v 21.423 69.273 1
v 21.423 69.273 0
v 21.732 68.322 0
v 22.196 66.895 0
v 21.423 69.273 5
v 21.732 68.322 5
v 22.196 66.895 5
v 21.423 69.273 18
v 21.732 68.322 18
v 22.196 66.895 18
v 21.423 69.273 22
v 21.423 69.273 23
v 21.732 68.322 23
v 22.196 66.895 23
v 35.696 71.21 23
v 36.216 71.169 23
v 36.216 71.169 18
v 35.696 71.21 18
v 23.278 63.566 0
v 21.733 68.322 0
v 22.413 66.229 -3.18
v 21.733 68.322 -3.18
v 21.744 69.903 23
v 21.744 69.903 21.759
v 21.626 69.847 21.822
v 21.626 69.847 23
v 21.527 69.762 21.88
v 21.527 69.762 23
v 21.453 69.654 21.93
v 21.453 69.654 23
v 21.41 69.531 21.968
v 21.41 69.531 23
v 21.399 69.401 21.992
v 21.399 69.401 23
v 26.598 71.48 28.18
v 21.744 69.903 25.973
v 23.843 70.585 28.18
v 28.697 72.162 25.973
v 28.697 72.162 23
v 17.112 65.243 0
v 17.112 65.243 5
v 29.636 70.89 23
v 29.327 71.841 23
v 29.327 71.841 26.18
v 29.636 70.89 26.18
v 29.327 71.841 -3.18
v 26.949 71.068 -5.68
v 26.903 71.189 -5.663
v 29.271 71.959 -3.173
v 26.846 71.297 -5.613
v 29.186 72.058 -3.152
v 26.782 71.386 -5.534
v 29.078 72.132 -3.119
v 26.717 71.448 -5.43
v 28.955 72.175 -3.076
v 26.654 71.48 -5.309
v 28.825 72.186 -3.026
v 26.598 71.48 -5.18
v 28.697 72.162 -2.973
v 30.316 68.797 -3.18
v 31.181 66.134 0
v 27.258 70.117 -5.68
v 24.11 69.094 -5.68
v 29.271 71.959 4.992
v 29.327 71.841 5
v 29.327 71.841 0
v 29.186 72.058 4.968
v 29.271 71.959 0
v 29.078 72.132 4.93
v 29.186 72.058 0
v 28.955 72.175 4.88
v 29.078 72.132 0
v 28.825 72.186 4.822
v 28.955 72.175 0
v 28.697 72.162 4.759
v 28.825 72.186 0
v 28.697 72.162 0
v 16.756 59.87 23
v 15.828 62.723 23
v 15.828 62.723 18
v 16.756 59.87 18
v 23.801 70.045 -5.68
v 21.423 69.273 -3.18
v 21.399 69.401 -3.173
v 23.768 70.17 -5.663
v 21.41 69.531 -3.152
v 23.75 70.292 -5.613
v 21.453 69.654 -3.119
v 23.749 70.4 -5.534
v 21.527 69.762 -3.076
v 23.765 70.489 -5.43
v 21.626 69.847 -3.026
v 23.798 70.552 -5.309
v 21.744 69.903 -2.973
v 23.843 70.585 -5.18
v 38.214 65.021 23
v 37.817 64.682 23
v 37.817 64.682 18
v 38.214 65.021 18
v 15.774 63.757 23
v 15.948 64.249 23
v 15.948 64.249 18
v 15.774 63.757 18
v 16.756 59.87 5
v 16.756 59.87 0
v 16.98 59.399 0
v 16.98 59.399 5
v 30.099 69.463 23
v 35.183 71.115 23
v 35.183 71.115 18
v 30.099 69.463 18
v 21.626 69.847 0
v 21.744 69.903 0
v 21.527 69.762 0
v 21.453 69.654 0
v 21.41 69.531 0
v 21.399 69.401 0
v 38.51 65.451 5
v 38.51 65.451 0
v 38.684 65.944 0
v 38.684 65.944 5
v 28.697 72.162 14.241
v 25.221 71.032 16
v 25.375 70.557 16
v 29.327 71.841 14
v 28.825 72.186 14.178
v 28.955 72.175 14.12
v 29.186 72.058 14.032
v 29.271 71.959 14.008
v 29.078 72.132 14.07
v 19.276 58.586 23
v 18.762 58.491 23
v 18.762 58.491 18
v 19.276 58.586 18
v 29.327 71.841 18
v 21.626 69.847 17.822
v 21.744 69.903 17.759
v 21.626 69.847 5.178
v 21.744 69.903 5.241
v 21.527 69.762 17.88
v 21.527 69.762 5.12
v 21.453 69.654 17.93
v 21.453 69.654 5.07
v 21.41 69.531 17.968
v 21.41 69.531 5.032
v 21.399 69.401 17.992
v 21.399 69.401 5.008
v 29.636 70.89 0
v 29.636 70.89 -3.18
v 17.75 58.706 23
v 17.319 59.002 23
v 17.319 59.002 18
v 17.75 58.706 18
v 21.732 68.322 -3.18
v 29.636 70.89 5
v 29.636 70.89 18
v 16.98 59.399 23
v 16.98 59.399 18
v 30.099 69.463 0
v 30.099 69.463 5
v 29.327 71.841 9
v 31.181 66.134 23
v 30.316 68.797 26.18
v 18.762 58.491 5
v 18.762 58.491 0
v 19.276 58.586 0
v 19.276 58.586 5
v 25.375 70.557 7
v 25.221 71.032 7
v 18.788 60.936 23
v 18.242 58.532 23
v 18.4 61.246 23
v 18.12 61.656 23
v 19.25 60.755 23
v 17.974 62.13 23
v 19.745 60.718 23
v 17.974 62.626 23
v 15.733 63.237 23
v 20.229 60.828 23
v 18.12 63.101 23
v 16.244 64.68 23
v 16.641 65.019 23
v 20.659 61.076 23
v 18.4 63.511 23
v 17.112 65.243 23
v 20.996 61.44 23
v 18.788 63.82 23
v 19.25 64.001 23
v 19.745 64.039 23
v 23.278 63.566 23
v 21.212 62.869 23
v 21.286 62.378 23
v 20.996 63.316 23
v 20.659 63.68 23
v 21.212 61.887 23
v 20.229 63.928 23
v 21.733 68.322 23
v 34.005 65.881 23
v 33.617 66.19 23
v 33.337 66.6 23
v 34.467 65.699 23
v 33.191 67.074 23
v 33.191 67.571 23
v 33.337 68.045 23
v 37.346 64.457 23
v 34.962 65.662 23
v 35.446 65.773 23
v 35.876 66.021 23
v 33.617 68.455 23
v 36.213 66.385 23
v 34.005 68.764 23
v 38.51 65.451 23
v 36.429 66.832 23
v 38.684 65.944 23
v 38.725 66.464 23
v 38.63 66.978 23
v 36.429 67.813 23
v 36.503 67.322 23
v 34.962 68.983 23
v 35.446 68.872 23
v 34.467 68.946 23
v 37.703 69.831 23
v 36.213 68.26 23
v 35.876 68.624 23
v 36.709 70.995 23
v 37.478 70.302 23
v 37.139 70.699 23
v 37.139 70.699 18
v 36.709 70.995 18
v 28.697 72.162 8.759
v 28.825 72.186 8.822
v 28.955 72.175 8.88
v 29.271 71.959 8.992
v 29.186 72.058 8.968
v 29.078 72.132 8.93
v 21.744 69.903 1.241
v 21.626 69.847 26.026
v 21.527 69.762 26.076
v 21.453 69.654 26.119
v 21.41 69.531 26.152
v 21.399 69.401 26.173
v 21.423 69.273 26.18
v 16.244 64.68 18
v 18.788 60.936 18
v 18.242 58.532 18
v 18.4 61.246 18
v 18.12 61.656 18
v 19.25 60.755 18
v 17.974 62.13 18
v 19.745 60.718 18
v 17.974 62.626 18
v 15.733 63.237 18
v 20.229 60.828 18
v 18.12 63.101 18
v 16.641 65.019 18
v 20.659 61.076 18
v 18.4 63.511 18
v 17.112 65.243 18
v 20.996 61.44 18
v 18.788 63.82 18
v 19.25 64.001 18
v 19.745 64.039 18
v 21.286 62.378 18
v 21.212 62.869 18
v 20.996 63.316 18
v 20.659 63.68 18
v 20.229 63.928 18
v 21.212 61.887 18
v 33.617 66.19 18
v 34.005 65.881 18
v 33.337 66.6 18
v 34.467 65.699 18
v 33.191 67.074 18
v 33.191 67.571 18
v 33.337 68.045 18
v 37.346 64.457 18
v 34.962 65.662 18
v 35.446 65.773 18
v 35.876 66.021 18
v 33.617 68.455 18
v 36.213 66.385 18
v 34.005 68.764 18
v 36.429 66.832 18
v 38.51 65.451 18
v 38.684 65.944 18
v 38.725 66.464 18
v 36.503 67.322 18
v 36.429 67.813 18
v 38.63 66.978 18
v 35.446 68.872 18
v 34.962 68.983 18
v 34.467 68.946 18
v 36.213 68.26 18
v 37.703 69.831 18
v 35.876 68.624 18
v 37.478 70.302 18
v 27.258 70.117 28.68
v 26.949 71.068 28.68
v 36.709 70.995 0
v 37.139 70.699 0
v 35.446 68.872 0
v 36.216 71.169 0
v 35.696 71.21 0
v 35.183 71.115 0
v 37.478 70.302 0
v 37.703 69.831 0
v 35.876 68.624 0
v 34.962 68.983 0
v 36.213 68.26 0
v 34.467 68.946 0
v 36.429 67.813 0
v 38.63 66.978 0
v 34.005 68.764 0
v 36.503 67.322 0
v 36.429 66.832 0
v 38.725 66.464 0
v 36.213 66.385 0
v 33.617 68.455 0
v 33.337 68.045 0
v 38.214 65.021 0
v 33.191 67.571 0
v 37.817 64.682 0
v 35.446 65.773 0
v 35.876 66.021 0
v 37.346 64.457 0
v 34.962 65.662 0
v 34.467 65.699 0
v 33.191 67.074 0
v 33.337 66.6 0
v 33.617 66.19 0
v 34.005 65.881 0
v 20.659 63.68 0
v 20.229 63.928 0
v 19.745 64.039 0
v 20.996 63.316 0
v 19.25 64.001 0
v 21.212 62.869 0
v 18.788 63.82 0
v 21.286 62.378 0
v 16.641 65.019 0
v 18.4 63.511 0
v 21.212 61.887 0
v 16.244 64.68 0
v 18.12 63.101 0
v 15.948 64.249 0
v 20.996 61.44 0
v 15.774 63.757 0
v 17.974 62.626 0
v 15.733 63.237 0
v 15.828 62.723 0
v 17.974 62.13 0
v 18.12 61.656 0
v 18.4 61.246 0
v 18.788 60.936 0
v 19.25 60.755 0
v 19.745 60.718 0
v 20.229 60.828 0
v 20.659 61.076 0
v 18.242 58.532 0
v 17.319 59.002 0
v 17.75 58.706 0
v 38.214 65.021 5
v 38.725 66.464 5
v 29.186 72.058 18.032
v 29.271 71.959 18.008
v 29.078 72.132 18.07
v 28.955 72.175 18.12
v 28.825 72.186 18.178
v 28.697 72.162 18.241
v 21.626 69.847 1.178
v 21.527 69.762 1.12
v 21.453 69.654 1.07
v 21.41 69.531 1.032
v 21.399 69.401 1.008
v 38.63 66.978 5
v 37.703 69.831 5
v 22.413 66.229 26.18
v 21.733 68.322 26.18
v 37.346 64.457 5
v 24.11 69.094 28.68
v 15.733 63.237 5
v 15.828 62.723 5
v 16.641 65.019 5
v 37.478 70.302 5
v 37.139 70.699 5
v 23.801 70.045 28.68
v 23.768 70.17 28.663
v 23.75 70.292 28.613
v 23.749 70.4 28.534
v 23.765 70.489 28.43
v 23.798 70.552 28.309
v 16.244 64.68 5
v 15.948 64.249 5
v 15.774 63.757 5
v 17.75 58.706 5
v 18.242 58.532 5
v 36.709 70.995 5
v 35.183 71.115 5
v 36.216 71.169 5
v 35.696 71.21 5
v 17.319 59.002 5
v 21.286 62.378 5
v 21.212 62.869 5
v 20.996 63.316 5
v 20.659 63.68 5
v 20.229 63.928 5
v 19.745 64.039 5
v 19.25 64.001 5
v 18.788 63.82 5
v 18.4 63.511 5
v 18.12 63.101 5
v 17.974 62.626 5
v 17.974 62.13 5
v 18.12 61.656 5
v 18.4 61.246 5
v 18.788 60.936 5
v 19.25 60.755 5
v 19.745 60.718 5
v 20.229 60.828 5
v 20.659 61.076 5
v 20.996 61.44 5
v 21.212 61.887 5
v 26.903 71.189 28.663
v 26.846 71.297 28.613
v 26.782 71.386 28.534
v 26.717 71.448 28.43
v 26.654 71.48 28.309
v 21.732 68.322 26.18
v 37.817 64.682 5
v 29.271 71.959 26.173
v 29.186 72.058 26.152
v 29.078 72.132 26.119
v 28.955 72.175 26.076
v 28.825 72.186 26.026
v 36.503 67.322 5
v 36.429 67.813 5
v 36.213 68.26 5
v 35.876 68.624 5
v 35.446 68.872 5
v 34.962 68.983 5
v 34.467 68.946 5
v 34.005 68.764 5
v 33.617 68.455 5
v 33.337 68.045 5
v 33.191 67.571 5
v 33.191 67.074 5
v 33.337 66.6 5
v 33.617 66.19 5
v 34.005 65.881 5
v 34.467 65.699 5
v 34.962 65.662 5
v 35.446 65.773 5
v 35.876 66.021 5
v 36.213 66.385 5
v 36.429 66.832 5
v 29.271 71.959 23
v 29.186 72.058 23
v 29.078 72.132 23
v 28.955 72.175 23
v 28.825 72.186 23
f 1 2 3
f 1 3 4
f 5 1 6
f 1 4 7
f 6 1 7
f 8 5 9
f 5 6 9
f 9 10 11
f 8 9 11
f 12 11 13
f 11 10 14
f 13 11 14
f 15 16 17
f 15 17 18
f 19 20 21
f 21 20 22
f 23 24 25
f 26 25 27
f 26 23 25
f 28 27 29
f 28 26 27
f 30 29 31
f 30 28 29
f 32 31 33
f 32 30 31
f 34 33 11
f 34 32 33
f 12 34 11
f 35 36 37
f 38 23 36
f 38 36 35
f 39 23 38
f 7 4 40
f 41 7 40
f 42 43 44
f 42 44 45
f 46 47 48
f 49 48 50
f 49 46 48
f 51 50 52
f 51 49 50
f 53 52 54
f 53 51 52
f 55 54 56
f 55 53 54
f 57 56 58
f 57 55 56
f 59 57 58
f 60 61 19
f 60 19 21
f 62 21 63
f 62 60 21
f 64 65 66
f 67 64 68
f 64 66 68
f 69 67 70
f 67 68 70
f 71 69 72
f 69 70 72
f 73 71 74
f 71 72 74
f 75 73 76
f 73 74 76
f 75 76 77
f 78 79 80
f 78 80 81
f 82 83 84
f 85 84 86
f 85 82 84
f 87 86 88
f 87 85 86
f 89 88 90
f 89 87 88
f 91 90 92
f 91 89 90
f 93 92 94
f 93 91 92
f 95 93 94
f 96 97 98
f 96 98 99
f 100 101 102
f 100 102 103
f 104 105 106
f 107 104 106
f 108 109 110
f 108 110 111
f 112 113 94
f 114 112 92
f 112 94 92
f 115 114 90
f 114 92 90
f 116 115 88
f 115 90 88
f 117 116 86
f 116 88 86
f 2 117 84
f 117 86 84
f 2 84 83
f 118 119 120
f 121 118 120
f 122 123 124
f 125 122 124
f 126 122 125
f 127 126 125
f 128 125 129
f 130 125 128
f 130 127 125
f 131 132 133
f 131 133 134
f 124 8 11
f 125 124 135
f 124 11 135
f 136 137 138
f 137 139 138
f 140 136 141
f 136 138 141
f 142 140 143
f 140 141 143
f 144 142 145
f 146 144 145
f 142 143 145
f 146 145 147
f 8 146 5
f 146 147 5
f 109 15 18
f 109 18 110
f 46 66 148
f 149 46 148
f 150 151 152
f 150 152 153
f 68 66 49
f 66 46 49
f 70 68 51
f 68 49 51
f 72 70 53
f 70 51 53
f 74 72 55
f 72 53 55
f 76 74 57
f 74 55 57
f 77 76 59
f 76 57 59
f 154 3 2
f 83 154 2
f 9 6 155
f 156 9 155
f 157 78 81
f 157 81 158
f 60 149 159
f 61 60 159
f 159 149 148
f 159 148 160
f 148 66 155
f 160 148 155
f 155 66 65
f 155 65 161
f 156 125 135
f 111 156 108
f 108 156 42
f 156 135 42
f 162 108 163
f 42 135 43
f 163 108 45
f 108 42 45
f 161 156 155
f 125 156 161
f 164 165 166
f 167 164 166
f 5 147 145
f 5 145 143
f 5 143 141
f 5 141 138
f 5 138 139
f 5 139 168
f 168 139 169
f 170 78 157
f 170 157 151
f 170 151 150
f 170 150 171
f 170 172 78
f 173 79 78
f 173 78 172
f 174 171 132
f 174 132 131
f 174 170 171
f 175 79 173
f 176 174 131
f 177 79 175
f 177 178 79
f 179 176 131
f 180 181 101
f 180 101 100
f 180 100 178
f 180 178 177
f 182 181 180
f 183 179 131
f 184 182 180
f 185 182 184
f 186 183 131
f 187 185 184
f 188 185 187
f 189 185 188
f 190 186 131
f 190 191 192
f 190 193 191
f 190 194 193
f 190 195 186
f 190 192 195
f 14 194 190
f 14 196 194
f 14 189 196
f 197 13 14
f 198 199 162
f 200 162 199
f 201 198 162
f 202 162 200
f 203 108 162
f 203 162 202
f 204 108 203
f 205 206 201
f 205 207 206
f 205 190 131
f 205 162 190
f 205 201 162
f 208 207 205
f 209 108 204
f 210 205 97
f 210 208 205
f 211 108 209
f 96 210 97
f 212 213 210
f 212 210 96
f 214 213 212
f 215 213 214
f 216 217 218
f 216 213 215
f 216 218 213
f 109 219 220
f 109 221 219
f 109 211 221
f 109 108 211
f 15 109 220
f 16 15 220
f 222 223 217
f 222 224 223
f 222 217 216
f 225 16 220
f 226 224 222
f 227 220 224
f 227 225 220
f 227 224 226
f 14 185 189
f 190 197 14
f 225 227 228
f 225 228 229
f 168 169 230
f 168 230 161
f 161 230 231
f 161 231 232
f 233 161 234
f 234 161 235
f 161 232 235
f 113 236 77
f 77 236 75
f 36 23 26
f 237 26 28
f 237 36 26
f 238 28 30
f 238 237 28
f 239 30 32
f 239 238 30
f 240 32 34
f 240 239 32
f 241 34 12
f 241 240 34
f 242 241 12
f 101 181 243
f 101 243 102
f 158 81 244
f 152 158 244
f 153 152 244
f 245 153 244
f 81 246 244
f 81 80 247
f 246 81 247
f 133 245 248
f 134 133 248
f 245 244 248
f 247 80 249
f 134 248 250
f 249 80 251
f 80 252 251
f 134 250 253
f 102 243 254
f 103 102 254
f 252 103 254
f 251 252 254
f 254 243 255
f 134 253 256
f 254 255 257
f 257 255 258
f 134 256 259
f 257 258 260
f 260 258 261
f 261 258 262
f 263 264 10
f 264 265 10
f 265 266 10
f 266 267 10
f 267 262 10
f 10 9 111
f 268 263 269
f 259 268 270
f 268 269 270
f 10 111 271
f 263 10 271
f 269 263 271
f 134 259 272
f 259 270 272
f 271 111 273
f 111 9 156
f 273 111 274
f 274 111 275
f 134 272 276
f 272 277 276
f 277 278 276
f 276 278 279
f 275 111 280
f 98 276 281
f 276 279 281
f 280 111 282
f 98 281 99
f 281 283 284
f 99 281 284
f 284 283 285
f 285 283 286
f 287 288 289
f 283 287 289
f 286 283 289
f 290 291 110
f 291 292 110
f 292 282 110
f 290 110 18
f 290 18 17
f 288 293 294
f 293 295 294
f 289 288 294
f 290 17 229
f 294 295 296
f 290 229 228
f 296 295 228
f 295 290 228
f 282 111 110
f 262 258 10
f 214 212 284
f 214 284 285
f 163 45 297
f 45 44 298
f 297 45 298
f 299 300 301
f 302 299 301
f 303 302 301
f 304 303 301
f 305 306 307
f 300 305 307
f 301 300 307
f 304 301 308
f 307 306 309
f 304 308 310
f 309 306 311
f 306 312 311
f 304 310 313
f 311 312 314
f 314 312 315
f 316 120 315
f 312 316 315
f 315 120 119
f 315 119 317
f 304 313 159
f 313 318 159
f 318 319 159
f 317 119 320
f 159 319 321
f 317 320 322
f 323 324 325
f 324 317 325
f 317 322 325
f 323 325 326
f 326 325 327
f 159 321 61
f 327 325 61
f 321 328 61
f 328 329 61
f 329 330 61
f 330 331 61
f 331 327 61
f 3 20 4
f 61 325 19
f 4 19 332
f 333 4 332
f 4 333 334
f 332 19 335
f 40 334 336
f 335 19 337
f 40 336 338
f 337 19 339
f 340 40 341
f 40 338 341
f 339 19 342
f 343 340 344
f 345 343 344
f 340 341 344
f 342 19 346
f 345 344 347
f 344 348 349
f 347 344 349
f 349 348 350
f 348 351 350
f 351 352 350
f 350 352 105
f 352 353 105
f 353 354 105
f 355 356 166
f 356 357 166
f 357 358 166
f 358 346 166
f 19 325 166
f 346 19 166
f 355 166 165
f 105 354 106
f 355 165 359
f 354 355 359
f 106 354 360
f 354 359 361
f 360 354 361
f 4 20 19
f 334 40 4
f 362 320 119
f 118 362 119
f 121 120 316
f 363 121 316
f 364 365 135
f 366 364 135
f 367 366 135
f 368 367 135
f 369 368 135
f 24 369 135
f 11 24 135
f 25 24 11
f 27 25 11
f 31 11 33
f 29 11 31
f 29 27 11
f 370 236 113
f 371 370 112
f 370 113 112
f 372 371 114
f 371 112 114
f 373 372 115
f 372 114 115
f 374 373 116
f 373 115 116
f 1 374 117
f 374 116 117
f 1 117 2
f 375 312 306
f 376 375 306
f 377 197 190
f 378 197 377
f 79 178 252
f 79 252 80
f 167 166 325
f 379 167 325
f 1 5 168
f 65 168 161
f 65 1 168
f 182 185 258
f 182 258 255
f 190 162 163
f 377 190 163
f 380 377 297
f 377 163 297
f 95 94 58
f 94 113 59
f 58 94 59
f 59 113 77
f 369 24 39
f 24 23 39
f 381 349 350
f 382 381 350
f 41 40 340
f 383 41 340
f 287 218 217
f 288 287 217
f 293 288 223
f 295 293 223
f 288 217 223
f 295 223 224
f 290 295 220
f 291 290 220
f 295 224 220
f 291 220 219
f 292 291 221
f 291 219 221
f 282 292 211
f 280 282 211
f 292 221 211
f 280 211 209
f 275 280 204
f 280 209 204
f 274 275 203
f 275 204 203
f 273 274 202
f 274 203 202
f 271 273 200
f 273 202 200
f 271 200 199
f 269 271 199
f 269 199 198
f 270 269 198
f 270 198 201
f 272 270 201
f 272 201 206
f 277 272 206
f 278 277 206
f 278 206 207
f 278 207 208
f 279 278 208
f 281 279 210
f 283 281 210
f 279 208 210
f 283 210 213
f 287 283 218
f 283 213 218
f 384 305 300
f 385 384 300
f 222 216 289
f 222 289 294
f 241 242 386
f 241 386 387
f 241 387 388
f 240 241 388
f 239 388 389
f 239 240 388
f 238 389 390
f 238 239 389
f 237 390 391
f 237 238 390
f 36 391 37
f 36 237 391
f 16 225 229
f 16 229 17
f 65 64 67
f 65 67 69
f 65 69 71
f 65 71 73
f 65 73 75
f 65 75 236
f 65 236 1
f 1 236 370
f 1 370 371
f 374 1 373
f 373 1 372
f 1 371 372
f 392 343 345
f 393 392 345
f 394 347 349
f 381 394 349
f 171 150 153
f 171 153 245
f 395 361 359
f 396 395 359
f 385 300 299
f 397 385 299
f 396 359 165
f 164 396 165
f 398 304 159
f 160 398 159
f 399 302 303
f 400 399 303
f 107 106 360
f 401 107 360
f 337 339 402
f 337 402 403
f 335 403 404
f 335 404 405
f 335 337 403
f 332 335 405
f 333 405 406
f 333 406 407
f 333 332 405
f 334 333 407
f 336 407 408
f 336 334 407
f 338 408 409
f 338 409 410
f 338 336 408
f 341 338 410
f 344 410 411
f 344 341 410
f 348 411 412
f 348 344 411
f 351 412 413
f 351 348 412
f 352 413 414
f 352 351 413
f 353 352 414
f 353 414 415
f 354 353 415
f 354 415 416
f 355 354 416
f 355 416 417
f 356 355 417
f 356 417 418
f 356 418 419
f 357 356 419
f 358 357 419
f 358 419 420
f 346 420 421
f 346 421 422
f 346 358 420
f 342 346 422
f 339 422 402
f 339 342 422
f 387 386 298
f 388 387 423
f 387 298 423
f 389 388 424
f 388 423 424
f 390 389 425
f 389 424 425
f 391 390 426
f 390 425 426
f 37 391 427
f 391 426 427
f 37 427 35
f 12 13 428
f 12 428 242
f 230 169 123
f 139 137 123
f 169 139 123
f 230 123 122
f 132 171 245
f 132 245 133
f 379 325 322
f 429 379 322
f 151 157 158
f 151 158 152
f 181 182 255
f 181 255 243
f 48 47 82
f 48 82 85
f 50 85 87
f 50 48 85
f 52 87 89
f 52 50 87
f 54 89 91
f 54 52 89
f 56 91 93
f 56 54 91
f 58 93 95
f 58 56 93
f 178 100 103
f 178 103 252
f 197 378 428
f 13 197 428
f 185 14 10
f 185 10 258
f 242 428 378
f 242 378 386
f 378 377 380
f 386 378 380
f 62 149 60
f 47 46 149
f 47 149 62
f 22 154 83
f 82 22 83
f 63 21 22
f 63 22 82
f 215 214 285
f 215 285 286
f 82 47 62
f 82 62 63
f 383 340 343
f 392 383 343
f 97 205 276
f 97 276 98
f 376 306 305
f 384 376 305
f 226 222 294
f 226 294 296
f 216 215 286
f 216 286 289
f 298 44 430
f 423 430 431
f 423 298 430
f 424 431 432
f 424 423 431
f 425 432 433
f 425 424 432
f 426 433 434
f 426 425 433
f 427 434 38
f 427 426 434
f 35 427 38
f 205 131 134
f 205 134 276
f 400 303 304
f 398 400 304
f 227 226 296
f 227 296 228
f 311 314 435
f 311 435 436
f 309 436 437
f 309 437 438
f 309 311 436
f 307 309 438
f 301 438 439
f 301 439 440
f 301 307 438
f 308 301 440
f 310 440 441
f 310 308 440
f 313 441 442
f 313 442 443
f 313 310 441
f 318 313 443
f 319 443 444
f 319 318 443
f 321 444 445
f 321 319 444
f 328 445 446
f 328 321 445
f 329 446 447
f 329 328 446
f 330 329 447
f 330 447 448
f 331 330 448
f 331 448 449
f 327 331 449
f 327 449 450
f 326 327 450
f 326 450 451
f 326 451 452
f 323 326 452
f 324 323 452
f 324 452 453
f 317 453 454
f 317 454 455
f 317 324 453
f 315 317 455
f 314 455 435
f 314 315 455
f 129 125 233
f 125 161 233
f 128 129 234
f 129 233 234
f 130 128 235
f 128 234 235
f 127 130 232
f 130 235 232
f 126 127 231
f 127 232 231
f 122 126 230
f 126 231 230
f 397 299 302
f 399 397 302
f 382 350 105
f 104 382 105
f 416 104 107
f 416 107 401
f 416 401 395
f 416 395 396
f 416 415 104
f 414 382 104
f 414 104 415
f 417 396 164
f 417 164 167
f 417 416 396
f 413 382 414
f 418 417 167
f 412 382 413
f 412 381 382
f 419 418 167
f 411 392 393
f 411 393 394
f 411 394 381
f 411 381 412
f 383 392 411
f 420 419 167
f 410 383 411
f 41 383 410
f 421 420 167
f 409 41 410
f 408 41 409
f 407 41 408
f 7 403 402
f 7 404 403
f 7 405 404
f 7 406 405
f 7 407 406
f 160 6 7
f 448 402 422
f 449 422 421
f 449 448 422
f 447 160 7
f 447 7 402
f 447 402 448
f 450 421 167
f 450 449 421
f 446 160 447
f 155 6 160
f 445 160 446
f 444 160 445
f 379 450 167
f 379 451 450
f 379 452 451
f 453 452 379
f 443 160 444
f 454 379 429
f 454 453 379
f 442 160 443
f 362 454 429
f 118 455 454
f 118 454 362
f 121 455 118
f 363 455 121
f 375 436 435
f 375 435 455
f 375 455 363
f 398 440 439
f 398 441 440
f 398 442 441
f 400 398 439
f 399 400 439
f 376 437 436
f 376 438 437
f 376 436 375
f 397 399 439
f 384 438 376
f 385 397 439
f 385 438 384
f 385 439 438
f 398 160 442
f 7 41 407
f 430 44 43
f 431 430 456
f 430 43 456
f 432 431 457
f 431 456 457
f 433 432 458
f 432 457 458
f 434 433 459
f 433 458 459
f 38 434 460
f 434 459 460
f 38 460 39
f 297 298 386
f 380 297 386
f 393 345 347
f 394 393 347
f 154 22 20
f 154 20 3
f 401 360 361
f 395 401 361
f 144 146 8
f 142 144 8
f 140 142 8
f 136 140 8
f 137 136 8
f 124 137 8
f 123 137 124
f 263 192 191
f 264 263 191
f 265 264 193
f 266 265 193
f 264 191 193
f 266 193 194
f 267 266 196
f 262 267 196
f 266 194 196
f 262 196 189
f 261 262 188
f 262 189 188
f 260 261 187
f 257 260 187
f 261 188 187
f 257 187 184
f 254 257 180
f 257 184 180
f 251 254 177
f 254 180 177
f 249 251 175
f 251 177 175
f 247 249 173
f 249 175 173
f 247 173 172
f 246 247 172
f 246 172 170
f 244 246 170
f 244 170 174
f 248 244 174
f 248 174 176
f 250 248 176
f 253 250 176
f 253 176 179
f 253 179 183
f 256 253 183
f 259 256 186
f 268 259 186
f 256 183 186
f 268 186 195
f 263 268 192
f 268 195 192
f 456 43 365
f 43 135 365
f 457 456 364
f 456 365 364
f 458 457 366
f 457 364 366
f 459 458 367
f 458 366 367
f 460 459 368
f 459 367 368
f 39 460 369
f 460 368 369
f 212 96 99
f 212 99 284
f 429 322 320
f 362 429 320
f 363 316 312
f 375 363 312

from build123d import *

# Parameters (mm, degrees)
MODEL_R             = 1.665
BOSS_EXTRUDE1_DEPTH = 5
SKETCH2_W           = 8.310460331
SKETCH2_H           = 5
BOSS_EXTRUDE2_DEPTH = 1.5
BOSS_EXTRUDE3_DEPTH = 1.5
BOSS_EXTRUDE4_DEPTH = 5.68
BOSS_EXTRUDE5_DEPTH = 8.31
CUT_EXTRUDE1_DEPTH  = 0.5
CHAMFER1_SIZE       = 2.5
FILLET1_R           = 0.5


with BuildPart() as part:
    # Model → Boss-Extrude1 (new body)
    with BuildSketch(Plane.XY):
        Polygon((17.1125, 65.2434), (16.6413, 65.0186), (16.2442, 64.6796), (15.9485, 64.2493), (15.7742, 63.7571), (15.7333, 63.2366), (15.8284, 62.7233), (16.7555, 59.8701), (16.9802, 59.3988), (17.3193, 59.0018), (17.7496, 58.7061), (18.2418, 58.5318), (18.7623, 58.4909), (19.2756, 58.586), (37.3457, 64.4573), (37.8169, 64.6821), (38.214, 65.0212), (38.5097, 65.4515), (38.684, 65.9436), (38.7249, 66.4641), (38.6298, 66.9775), (37.7027, 69.8306), (37.478, 70.3019), (37.1389, 70.6989), (36.7086, 70.9946), (36.2164, 71.1689), (35.6959, 71.2099), (35.1826, 71.1147), align=None)
        with Locations((34.8376, 67.3225)):
            Circle(MODEL_R, mode=Mode.SUBTRACT)
        with Locations((19.6206, 62.3782)):
            Circle(MODEL_R, mode=Mode.SUBTRACT)
    boss_extrude1 = extrude(amount=BOSS_EXTRUDE1_DEPTH)

    # Sketch2 → Boss-Extrude2 (add)
    with BuildSketch(Plane(origin=(-17.540388664, 53.984054163, 0), x_dir=(0.9510570020345874, 0.3090154994186907, 0), z_dir=(-0.3090154994186907, 0.9510570020345874, 0))):
        with Locations((45.9361937, -2.5)):
            Rectangle(SKETCH2_W, SKETCH2_H)
    boss_extrude2 = extrude(amount=BOSS_EXTRUDE2_DEPTH)

    # Sketch3 → Boss-Extrude3 (add)
    with BuildSketch(Plane(origin=(-18.003911914, 55.410639666, 0), x_dir=(0.9510570020345874, 0.30901549941869066, 0), z_dir=(-0.30901549941869066, 0.9510570020345874, 0))):
        Polygon((41.780963534, 0), (41.780963534, -5), (41.780963534, -11.5), (50.091423865, -11.5), (50.091423865, -5), (50.091423865, 0), align=None)
    boss_extrude3 = extrude(amount=BOSS_EXTRUDE3_DEPTH)

    # Mirror4: Boss-Extrude3 across plane
    add(boss_extrude3.mirror(Plane.XY.offset(11.5)))

    # Mirror5: Boss-Extrude2 across plane
    add(boss_extrude2.mirror(Plane.XY.offset(11.5)))

    # Mirror8: Boss-Extrude1 across plane
    add(boss_extrude1.mirror(Plane.XY.offset(11.5)))

    # Sketch5 → Boss-Extrude4 (add)
    with BuildSketch(Plane(origin=(0, 0, 0), x_dir=(-1, 0, 0), z_dir=(0, 0, -1))):
        Polygon((-29.172364246, 72.316251531), (-29.635887495, 70.889666028), (-21.732166007, 68.321604978), (-21.268642758, 69.748190481), align=None)
    boss_extrude4 = extrude(amount=BOSS_EXTRUDE4_DEPTH)

    # Mirror9: Boss-Extrude4 across plane
    add(boss_extrude4.mirror(Plane.XY.offset(11.5)))

    # Sketch7 → Boss-Extrude5 (add)
    with BuildSketch(Plane(origin=(47.639799409, 15.479026362, 0), x_dir=(0, 0, -1), z_dir=(0.9510570020345875, 0.3090154994186908, 0))):
        Polygon((5.68, 58.262164673), (0, 58.262164673), (0, 53.262164673), align=None)
    boss_extrude5 = extrude(amount=-BOSS_EXTRUDE5_DEPTH)

    # Mirror10: Boss-Extrude5 across plane
    add(boss_extrude5.mirror(Plane.XY.offset(11.5)))

    # Sketch8 → Cut-Extrude1 (cut)
    with BuildSketch(Plane(origin=(-18.467435163, 56.837225169, 0), x_dir=(0.9510570020345874, 0.30901549941869066, 0), z_dir=(-0.30901549941869066, 0.9510570020345874, 0))):
        Polygon((45.936193699, -7), (50.091423865, -9), (50.091423865, -5), (41.780963534, -1), (41.780963534, -5), align=None)
    cut_extrude1 = extrude(amount=-CUT_EXTRUDE1_DEPTH, mode=Mode.SUBTRACT)

    # Mirror11: Cut-Extrude1 across plane
    add(cut_extrude1.mirror(Plane.XY.offset(11.5)), mode=Mode.SUBTRACT)

    # Chamfer1
    # the kernel refuses this chamfer: 2.5 mm, written as the material it takes off along each edge
    with BuildSketch(Plane(origin=(27.185639489, 78.430794313, -5.68), x_dir=(0.02615014597757756, 0.008496652042775076, 0.9996219169112968), z_dir=(0.30901549941868806, -0.9510570020345883, 0)), Plane(origin=(23.718890764, 62.207062196, -5.68), x_dir=(-0.026150145977578018, -0.008496652042775138, 0.9996219169112968), z_dir=(-0.30901549941868506, 0.9510570020345892, 0))) as chamfer1_piece_1:
        Polygon((CHAMFER1_SIZE * 0.999621916911, CHAMFER1_SIZE * 0.0274958766106), (-CHAMFER1_SIZE * 0.0274958766106, CHAMFER1_SIZE * 0.999621916911), (0, 0), align=None)
    extrude(amount=14.35841494, mode=Mode.SUBTRACT)
    with BuildSketch(Plane(origin=(23.718890764, 62.207062196, 28.68), x_dir=(-0.026150145977578018, -0.008496652042775138, -0.9996219169112968), z_dir=(-0.30901549941868506, 0.9510570020345892, 0)), Plane(origin=(27.185639489, 78.430794313, 28.68), x_dir=(0.02615014597757756, 0.008496652042775076, -0.9996219169112968), z_dir=(0.30901549941868806, -0.9510570020345883, 0))) as chamfer1_piece_2:
        Polygon((CHAMFER1_SIZE * 0.999621916911, -CHAMFER1_SIZE * 0.0274958766106), (-CHAMFER1_SIZE * 0.0274958766106, -CHAMFER1_SIZE * 0.999621916911), (0, 0), align=None)
    extrude(amount=14.35841494, mode=Mode.SUBTRACT)

    # Fillet1
    fillet1_edges = [part.edges().sort_by_distance(p)[0] for p in [
        (29.172364246, 72.316251531, 0.91),
        (21.268642758, 69.748190481, 11.5),
        (29.172364246, 72.316251531, 11.5),
        (21.268642758, 69.748190481, 24.09),
        (21.268642758, 69.748190481, -1.09),
        (25.220503502, 71.032221006, 28.68),
        (29.172364246, 72.316251531, 22.09),
        (27.983542993, 71.929982157, 27.43),
        (22.45746401, 70.134459856, 27.43),
        (25.220503502, 71.032221006, -5.68),
        (22.45746401, 70.134459856, -4.43),
        (27.983542993, 71.929982157, -4.43),
    ]]
    fillet(fillet1_edges, radius=FILLET1_R)


solid = part.part
